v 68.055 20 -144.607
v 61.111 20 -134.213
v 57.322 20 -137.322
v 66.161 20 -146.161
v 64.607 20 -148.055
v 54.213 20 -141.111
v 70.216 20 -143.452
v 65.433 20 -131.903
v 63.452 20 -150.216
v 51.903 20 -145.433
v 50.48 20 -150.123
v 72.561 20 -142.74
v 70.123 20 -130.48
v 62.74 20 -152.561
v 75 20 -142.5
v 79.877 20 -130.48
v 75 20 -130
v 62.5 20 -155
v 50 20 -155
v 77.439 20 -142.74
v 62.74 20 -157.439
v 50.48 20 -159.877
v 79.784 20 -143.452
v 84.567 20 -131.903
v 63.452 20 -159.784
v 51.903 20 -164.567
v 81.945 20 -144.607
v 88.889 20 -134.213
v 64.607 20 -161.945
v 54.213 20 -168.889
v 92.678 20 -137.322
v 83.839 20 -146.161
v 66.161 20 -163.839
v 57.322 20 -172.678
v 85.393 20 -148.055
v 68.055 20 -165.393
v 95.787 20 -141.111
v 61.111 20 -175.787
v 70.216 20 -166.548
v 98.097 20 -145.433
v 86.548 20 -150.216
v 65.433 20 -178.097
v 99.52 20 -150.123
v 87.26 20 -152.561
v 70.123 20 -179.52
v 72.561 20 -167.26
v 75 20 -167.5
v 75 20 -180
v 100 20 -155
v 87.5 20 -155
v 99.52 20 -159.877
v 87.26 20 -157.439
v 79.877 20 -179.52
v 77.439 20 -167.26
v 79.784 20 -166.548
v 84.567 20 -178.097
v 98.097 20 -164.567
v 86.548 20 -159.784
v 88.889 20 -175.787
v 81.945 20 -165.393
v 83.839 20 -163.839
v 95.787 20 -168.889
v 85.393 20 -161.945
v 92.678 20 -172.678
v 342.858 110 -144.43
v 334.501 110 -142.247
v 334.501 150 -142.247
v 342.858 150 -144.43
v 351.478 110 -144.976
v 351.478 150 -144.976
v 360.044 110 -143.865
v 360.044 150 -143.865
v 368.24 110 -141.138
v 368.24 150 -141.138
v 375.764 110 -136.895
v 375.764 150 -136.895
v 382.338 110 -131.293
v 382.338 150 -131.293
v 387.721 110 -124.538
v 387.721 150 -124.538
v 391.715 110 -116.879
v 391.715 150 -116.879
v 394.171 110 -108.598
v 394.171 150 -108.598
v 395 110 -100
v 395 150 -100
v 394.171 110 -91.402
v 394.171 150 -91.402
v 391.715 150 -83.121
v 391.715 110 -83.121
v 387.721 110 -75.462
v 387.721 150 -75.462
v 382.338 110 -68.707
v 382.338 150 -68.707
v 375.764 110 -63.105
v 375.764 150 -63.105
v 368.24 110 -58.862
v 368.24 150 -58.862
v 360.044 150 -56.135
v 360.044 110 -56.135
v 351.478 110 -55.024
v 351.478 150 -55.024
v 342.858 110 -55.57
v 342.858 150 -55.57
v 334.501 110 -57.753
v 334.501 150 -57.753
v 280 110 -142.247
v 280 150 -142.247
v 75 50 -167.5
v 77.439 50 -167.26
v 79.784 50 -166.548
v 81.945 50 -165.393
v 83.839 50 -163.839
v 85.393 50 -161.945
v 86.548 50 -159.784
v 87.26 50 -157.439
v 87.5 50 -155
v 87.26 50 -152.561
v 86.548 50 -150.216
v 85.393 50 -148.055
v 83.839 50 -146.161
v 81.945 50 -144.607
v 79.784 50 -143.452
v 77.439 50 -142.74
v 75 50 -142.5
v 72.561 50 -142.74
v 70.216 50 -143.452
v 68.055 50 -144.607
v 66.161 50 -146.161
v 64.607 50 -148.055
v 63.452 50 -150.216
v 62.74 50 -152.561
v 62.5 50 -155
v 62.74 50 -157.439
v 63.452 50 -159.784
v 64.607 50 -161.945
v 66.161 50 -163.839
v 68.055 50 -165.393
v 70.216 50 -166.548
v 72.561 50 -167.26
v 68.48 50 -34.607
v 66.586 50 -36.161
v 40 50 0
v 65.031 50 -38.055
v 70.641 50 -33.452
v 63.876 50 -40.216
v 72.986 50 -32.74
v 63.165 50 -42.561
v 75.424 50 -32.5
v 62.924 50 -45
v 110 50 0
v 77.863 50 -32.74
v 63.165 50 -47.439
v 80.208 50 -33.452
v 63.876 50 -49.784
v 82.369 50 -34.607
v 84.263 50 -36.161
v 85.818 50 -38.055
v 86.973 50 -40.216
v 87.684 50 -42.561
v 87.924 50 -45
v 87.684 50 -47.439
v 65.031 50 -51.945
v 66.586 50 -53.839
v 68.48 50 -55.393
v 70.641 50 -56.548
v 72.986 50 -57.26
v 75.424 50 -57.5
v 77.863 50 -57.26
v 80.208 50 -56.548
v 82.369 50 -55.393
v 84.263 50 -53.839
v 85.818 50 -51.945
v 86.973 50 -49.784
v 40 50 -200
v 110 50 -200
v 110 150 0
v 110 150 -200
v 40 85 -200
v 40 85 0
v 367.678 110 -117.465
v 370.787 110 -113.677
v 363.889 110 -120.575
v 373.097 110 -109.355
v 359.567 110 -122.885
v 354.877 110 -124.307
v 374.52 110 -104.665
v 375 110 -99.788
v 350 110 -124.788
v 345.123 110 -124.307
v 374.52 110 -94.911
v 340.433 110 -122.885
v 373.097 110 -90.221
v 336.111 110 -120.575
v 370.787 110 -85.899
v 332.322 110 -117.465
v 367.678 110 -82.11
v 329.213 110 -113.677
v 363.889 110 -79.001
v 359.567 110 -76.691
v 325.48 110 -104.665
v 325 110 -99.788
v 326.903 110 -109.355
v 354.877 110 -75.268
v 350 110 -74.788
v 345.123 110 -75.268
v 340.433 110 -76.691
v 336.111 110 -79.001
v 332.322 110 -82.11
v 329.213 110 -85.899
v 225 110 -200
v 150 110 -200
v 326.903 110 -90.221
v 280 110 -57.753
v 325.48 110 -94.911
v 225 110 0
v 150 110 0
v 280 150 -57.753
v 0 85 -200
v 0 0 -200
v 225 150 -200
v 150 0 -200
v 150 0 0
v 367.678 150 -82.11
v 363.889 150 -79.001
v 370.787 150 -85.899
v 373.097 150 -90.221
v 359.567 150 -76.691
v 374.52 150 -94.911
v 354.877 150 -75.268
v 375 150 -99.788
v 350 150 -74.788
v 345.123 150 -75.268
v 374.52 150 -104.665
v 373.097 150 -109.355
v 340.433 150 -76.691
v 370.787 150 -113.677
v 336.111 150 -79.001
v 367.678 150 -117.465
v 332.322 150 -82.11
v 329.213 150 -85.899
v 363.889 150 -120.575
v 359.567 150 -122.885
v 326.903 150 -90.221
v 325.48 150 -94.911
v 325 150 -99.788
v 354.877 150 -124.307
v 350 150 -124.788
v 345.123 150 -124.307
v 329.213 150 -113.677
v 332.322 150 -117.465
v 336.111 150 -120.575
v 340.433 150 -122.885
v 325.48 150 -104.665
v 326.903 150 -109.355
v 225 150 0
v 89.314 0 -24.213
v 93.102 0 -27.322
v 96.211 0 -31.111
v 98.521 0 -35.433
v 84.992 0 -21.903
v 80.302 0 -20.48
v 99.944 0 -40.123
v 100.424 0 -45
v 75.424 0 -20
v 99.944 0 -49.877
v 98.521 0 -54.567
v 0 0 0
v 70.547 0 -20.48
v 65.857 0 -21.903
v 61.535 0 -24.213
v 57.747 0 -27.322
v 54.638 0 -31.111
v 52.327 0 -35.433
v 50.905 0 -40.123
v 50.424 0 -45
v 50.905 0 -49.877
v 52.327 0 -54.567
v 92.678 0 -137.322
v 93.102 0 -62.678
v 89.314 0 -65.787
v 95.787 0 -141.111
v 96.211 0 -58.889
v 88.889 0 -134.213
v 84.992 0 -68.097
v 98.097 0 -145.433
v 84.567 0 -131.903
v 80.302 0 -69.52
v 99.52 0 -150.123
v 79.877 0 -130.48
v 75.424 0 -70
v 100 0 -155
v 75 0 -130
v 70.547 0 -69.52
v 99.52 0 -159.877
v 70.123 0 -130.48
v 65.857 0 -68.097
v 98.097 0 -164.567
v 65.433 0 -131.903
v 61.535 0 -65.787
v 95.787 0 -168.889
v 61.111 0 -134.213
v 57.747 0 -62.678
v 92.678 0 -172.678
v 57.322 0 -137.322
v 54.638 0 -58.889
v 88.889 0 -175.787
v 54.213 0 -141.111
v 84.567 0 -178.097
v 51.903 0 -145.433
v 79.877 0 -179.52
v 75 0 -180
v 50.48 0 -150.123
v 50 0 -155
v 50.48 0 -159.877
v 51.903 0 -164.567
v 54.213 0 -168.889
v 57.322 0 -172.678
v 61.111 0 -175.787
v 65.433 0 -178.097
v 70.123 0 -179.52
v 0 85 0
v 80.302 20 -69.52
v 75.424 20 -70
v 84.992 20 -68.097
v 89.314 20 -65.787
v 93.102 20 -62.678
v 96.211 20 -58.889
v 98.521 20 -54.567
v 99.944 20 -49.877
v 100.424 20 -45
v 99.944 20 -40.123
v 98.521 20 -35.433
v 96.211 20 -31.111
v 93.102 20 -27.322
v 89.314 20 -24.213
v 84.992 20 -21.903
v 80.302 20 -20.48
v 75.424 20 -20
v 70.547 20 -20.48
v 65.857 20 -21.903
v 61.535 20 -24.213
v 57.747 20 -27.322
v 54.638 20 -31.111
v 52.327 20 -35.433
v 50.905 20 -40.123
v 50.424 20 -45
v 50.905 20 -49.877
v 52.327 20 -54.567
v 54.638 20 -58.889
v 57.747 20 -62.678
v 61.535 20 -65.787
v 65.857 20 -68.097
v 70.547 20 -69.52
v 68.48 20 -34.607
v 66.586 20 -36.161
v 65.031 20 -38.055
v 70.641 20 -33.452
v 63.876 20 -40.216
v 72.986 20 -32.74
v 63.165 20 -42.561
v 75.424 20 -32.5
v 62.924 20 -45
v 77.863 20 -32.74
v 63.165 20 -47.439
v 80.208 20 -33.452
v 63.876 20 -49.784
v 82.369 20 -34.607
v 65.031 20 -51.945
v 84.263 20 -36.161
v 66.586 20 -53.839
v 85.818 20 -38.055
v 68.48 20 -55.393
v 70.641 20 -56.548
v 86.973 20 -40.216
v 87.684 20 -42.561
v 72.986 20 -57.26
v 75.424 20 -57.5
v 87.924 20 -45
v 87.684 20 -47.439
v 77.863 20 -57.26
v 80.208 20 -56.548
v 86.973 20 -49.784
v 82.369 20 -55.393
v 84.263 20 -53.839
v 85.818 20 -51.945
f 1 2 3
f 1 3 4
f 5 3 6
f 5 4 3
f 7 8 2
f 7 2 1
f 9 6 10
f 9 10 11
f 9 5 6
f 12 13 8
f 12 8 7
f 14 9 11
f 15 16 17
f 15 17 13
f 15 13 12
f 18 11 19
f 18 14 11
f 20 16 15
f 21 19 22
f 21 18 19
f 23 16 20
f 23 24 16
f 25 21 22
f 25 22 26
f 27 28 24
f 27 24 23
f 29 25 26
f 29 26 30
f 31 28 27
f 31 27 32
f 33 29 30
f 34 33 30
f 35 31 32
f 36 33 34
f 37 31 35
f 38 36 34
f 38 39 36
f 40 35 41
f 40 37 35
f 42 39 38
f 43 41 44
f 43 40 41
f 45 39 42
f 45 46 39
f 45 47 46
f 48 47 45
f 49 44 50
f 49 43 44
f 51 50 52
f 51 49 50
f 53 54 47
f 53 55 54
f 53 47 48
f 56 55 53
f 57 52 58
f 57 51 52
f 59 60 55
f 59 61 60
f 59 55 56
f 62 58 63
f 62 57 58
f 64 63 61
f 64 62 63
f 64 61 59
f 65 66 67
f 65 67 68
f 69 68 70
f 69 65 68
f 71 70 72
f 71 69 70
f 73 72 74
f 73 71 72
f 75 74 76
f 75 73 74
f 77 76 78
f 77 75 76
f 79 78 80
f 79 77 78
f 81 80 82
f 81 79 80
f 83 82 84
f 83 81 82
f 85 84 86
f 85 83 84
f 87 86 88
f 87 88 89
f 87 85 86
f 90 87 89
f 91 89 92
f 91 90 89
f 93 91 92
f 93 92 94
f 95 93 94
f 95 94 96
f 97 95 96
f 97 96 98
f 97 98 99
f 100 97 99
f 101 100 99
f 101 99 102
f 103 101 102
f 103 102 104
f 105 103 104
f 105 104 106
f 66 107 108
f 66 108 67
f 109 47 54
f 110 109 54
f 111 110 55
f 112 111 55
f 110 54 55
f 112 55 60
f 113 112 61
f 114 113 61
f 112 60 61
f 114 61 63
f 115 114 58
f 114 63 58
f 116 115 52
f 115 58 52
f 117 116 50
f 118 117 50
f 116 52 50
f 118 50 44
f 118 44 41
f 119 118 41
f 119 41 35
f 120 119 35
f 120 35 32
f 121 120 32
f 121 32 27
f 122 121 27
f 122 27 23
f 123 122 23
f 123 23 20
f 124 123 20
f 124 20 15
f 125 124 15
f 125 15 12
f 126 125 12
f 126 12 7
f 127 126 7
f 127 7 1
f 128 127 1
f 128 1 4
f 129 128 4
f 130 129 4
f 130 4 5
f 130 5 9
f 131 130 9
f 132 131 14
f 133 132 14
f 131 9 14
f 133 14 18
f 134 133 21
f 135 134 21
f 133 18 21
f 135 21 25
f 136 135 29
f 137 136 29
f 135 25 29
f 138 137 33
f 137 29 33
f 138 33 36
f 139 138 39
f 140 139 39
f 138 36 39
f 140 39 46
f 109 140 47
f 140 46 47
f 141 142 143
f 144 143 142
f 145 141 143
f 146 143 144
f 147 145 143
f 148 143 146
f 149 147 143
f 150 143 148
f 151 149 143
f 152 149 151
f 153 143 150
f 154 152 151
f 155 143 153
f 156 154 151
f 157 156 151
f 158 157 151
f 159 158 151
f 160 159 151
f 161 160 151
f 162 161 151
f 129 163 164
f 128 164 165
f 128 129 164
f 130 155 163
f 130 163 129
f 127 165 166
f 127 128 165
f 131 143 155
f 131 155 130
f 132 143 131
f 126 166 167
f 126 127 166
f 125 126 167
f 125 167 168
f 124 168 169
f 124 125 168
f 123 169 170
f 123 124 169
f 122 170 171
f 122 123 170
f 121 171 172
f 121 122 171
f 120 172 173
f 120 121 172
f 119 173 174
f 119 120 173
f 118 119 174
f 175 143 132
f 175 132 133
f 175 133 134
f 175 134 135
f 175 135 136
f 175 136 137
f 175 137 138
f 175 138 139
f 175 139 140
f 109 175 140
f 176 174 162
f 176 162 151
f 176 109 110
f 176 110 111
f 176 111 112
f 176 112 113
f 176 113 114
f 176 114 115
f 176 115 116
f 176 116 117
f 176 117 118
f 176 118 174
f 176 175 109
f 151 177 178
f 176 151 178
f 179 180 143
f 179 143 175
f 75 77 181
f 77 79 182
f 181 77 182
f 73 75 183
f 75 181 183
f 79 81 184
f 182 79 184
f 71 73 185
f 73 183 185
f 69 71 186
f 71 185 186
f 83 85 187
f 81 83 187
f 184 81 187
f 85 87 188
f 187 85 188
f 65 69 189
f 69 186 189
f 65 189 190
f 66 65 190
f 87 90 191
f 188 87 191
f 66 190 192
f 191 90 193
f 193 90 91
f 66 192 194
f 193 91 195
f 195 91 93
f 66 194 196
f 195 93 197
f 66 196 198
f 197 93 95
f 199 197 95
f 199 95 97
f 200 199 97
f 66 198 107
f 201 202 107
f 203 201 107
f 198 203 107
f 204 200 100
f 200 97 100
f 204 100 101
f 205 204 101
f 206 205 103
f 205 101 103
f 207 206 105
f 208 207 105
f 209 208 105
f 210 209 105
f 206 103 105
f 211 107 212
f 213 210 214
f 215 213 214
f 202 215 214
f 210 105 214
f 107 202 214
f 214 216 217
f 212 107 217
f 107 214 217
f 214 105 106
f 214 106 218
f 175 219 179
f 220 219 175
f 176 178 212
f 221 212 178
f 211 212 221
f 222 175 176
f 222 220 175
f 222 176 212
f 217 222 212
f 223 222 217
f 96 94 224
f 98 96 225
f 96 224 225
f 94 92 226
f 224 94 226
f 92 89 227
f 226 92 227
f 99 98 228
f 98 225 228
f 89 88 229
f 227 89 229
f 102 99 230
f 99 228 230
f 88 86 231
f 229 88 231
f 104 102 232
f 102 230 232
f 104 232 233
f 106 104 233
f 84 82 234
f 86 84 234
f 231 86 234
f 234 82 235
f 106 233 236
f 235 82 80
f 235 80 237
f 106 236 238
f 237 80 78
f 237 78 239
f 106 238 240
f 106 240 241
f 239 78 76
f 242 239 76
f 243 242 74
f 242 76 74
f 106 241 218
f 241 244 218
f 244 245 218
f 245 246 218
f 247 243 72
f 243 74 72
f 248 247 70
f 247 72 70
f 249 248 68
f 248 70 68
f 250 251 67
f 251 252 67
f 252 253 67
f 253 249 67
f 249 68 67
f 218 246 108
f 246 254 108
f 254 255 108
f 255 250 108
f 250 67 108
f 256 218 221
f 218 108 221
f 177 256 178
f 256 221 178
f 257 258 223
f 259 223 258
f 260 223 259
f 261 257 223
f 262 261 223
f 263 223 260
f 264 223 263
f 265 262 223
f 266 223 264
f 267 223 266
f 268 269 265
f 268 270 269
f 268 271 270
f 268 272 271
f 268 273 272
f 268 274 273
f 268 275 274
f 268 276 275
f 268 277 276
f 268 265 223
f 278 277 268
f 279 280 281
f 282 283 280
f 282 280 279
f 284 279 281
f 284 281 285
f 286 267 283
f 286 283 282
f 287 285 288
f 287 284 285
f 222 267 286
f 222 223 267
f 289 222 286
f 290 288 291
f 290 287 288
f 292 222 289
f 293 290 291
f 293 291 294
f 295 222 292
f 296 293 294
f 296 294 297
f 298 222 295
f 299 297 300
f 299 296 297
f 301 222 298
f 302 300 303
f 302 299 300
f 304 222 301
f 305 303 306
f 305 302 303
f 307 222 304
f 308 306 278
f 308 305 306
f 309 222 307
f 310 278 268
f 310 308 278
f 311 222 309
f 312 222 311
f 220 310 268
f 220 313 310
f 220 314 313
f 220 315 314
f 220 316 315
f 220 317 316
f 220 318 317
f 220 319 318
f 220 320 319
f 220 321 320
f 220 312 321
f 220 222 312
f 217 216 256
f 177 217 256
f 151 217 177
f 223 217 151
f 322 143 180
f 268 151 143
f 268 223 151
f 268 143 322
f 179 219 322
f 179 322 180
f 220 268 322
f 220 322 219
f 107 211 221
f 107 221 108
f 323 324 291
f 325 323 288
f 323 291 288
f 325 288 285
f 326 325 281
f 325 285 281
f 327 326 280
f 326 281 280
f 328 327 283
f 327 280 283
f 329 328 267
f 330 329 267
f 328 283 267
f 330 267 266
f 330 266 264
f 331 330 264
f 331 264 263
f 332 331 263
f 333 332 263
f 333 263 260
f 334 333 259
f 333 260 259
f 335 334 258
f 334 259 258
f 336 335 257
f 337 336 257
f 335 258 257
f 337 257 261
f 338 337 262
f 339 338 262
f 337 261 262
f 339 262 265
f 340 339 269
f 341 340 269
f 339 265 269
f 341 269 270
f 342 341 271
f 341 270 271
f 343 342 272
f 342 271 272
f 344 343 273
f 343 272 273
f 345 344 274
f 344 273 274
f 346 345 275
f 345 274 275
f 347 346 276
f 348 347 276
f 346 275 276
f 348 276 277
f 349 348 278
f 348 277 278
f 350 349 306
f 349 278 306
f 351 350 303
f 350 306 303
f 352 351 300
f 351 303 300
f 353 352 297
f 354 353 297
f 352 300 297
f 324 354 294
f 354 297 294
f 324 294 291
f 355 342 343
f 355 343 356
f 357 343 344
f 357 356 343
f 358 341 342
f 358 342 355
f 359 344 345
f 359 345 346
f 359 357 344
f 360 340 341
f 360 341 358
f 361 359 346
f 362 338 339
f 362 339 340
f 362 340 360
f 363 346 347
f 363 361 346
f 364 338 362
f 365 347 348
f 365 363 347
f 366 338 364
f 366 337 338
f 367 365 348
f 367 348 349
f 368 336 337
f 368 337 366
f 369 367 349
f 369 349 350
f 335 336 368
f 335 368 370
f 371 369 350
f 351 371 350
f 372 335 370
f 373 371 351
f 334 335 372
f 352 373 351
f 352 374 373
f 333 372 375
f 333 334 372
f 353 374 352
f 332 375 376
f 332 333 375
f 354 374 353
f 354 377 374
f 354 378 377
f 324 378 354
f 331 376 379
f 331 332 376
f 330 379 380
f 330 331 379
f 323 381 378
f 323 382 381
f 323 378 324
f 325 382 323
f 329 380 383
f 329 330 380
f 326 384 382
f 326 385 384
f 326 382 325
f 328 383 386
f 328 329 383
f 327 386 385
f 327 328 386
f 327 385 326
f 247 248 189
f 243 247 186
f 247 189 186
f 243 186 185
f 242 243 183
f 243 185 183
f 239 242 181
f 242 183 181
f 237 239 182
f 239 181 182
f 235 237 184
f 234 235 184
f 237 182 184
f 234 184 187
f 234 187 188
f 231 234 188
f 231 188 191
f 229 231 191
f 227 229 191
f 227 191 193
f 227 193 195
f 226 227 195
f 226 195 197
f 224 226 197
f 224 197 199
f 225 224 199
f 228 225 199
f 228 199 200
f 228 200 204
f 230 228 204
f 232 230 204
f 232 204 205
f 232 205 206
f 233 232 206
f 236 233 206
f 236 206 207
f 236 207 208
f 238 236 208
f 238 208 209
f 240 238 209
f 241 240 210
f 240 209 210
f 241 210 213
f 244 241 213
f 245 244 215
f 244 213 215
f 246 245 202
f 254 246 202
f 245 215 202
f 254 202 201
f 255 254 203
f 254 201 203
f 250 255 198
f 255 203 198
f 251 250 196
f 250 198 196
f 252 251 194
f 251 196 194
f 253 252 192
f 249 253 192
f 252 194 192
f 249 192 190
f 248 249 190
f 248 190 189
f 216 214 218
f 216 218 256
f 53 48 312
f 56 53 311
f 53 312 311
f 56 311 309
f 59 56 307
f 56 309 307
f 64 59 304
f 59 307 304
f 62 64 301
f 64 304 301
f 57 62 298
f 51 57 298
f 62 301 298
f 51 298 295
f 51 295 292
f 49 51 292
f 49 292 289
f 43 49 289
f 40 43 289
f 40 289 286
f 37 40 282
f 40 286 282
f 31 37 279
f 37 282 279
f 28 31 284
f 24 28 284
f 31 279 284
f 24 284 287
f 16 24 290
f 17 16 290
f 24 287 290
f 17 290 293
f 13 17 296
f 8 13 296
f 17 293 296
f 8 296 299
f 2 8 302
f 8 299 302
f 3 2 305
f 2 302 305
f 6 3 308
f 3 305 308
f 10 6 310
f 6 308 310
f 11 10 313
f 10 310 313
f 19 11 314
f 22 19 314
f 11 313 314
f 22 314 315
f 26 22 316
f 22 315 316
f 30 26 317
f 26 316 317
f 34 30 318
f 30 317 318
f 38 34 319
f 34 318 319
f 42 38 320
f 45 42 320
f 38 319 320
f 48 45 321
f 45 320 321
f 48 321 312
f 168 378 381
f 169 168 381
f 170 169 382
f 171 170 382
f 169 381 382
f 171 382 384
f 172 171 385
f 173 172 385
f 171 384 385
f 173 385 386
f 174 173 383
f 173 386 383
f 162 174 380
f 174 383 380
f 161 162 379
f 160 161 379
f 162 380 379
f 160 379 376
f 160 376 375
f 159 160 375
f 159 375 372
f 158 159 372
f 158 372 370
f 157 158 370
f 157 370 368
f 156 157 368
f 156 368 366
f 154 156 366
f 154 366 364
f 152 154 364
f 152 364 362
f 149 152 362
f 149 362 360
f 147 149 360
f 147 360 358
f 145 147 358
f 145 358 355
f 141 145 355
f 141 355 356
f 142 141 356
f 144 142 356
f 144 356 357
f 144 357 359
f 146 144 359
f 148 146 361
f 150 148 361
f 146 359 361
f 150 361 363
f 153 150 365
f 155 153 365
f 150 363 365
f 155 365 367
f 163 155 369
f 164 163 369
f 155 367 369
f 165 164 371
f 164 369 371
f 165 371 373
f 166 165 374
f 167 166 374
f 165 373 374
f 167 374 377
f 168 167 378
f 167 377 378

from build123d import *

# Parameters (mm, degrees)
BOSS_EXTRUDE3_DEPTH = 150
SKETCH6_R           = 12.5
CUT_EXTRUDE3_DEPTH  = 50
SKETCH7_R           = 25
CUT_EXTRUDE4_DEPTH  = 20
SKETCH8_R           = 12.5
CUT_EXTRUDE7_DEPTH  = 50
SKETCH11_R          = 25
CUT_EXTRUDE8_DEPTH  = 20
SKETCH12_R          = 25
CUT_EXTRUDE9_DEPTH  = 150
SKETCH14_W          = 40
SKETCH14_H          = 200
CUT_EXTRUDE10_DEPTH = 65
SKETCH15_W          = 70
SKETCH15_H          = 200
CUT_EXTRUDE11_DEPTH = 100
CUT_EXTRUDE12_DEPTH = 110


with BuildPart() as part:
    # Sketch2 → Boss-Extrude3 (new body)
    with BuildSketch(Plane(origin=(0, 0, 0), x_dir=(1, 0, 0), z_dir=(0, 1, 0))):
        with BuildLine():
            Line((0, 0), (0, 200))
            Line((0, 200), (225, 200))
            Line((225, 200), (280, 142.246569699))
            Line((280, 142.246569699), (334.500730705, 142.246569699))
            ThreePointArc((334.500730705, 142.246569699), (395, 100), (334.500730705, 57.753430301))
            Line((334.500730705, 57.753430301), (280, 57.753430301))
            Line((280, 57.753430301), (225, 0))
            Line((225, 0), (0, 0))
        make_face()
    extrude(amount=BOSS_EXTRUDE3_DEPTH)

    # Sketch6 → Cut-Extrude3 (cut)
    with BuildSketch(Plane.XZ):
        with Locations(Location((75.424439909, -45, 0), (0, 0, 270))):
            Circle(SKETCH6_R)
    extrude(amount=-CUT_EXTRUDE3_DEPTH, mode=Mode.SUBTRACT)

    # Sketch7 → Cut-Extrude4 (cut)
    with BuildSketch(Plane.XZ):
        with Locations(Location((75.424439909, -45, 0), (0, 0, 270))):
            Circle(SKETCH7_R)
    extrude(amount=-CUT_EXTRUDE4_DEPTH, mode=Mode.SUBTRACT)

    # Sketch8 → Cut-Extrude7 (cut)
    with BuildSketch(Plane.XZ):
        with Locations(Location((75, -155, 0), (0, 0, 270))):
            Circle(SKETCH8_R)
    extrude(amount=-CUT_EXTRUDE7_DEPTH, mode=Mode.SUBTRACT)

    # Sketch11 → Cut-Extrude8 (cut)
    with BuildSketch(Plane(origin=(0, 0, 0), x_dir=(-1, 0, 0), z_dir=(0, -1, 0))):
        with Locations(Location((-75, 155, 0), (0, 0, 90))):
            Circle(SKETCH11_R)
    extrude(amount=-CUT_EXTRUDE8_DEPTH, mode=Mode.SUBTRACT)

    # Sketch12 → Cut-Extrude9 (cut)
    with BuildSketch(Plane(origin=(0, 0, 0), x_dir=(-1, 0, 0), z_dir=(0, -1, 0))):
        with Locations(Location((-350, 99.787780046, 0), (0, 0, 90))):
            Circle(SKETCH12_R)
    extrude(amount=-CUT_EXTRUDE9_DEPTH, mode=Mode.SUBTRACT)

    # Sketch14 → Cut-Extrude10 (cut)
    with BuildSketch(Plane(origin=(0, 150, 0), x_dir=(1, 0, 0), z_dir=(0, 1, 0))):
        with Locations((20, 100)):
            Rectangle(SKETCH14_W, SKETCH14_H)
    extrude(amount=-CUT_EXTRUDE10_DEPTH, mode=Mode.SUBTRACT)

    # Sketch15 → Cut-Extrude11 (cut)
    with BuildSketch(Plane(origin=(0, 150, 0), x_dir=(1, 0, 0), z_dir=(0, 1, 0))):
        with Locations((75, 100)):
            Rectangle(SKETCH15_W, SKETCH15_H)
    extrude(amount=-CUT_EXTRUDE11_DEPTH, mode=Mode.SUBTRACT)

    # Sketch16 → Cut-Extrude12 (cut)
    with BuildSketch(Plane.XZ):
        with BuildLine():
            Line((150, -200), (150, 0))
            Line((150, 0), (225, 0))
            Line((225, 0), (280, -57.753430301))
            Line((280, -57.753430301), (334.500730705, -57.753430301))
            ThreePointArc((334.500730705, -57.753430301), (395, -100), (334.500730705, -142.246569699))
            Line((334.500730705, -142.246569699), (280, -142.246569699))
            Line((280, -142.246569699), (225, -200))
            Line((225, -200), (150, -200))
        make_face()
    extrude(amount=-CUT_EXTRUDE12_DEPTH, mode=Mode.SUBTRACT)


solid = part.part
